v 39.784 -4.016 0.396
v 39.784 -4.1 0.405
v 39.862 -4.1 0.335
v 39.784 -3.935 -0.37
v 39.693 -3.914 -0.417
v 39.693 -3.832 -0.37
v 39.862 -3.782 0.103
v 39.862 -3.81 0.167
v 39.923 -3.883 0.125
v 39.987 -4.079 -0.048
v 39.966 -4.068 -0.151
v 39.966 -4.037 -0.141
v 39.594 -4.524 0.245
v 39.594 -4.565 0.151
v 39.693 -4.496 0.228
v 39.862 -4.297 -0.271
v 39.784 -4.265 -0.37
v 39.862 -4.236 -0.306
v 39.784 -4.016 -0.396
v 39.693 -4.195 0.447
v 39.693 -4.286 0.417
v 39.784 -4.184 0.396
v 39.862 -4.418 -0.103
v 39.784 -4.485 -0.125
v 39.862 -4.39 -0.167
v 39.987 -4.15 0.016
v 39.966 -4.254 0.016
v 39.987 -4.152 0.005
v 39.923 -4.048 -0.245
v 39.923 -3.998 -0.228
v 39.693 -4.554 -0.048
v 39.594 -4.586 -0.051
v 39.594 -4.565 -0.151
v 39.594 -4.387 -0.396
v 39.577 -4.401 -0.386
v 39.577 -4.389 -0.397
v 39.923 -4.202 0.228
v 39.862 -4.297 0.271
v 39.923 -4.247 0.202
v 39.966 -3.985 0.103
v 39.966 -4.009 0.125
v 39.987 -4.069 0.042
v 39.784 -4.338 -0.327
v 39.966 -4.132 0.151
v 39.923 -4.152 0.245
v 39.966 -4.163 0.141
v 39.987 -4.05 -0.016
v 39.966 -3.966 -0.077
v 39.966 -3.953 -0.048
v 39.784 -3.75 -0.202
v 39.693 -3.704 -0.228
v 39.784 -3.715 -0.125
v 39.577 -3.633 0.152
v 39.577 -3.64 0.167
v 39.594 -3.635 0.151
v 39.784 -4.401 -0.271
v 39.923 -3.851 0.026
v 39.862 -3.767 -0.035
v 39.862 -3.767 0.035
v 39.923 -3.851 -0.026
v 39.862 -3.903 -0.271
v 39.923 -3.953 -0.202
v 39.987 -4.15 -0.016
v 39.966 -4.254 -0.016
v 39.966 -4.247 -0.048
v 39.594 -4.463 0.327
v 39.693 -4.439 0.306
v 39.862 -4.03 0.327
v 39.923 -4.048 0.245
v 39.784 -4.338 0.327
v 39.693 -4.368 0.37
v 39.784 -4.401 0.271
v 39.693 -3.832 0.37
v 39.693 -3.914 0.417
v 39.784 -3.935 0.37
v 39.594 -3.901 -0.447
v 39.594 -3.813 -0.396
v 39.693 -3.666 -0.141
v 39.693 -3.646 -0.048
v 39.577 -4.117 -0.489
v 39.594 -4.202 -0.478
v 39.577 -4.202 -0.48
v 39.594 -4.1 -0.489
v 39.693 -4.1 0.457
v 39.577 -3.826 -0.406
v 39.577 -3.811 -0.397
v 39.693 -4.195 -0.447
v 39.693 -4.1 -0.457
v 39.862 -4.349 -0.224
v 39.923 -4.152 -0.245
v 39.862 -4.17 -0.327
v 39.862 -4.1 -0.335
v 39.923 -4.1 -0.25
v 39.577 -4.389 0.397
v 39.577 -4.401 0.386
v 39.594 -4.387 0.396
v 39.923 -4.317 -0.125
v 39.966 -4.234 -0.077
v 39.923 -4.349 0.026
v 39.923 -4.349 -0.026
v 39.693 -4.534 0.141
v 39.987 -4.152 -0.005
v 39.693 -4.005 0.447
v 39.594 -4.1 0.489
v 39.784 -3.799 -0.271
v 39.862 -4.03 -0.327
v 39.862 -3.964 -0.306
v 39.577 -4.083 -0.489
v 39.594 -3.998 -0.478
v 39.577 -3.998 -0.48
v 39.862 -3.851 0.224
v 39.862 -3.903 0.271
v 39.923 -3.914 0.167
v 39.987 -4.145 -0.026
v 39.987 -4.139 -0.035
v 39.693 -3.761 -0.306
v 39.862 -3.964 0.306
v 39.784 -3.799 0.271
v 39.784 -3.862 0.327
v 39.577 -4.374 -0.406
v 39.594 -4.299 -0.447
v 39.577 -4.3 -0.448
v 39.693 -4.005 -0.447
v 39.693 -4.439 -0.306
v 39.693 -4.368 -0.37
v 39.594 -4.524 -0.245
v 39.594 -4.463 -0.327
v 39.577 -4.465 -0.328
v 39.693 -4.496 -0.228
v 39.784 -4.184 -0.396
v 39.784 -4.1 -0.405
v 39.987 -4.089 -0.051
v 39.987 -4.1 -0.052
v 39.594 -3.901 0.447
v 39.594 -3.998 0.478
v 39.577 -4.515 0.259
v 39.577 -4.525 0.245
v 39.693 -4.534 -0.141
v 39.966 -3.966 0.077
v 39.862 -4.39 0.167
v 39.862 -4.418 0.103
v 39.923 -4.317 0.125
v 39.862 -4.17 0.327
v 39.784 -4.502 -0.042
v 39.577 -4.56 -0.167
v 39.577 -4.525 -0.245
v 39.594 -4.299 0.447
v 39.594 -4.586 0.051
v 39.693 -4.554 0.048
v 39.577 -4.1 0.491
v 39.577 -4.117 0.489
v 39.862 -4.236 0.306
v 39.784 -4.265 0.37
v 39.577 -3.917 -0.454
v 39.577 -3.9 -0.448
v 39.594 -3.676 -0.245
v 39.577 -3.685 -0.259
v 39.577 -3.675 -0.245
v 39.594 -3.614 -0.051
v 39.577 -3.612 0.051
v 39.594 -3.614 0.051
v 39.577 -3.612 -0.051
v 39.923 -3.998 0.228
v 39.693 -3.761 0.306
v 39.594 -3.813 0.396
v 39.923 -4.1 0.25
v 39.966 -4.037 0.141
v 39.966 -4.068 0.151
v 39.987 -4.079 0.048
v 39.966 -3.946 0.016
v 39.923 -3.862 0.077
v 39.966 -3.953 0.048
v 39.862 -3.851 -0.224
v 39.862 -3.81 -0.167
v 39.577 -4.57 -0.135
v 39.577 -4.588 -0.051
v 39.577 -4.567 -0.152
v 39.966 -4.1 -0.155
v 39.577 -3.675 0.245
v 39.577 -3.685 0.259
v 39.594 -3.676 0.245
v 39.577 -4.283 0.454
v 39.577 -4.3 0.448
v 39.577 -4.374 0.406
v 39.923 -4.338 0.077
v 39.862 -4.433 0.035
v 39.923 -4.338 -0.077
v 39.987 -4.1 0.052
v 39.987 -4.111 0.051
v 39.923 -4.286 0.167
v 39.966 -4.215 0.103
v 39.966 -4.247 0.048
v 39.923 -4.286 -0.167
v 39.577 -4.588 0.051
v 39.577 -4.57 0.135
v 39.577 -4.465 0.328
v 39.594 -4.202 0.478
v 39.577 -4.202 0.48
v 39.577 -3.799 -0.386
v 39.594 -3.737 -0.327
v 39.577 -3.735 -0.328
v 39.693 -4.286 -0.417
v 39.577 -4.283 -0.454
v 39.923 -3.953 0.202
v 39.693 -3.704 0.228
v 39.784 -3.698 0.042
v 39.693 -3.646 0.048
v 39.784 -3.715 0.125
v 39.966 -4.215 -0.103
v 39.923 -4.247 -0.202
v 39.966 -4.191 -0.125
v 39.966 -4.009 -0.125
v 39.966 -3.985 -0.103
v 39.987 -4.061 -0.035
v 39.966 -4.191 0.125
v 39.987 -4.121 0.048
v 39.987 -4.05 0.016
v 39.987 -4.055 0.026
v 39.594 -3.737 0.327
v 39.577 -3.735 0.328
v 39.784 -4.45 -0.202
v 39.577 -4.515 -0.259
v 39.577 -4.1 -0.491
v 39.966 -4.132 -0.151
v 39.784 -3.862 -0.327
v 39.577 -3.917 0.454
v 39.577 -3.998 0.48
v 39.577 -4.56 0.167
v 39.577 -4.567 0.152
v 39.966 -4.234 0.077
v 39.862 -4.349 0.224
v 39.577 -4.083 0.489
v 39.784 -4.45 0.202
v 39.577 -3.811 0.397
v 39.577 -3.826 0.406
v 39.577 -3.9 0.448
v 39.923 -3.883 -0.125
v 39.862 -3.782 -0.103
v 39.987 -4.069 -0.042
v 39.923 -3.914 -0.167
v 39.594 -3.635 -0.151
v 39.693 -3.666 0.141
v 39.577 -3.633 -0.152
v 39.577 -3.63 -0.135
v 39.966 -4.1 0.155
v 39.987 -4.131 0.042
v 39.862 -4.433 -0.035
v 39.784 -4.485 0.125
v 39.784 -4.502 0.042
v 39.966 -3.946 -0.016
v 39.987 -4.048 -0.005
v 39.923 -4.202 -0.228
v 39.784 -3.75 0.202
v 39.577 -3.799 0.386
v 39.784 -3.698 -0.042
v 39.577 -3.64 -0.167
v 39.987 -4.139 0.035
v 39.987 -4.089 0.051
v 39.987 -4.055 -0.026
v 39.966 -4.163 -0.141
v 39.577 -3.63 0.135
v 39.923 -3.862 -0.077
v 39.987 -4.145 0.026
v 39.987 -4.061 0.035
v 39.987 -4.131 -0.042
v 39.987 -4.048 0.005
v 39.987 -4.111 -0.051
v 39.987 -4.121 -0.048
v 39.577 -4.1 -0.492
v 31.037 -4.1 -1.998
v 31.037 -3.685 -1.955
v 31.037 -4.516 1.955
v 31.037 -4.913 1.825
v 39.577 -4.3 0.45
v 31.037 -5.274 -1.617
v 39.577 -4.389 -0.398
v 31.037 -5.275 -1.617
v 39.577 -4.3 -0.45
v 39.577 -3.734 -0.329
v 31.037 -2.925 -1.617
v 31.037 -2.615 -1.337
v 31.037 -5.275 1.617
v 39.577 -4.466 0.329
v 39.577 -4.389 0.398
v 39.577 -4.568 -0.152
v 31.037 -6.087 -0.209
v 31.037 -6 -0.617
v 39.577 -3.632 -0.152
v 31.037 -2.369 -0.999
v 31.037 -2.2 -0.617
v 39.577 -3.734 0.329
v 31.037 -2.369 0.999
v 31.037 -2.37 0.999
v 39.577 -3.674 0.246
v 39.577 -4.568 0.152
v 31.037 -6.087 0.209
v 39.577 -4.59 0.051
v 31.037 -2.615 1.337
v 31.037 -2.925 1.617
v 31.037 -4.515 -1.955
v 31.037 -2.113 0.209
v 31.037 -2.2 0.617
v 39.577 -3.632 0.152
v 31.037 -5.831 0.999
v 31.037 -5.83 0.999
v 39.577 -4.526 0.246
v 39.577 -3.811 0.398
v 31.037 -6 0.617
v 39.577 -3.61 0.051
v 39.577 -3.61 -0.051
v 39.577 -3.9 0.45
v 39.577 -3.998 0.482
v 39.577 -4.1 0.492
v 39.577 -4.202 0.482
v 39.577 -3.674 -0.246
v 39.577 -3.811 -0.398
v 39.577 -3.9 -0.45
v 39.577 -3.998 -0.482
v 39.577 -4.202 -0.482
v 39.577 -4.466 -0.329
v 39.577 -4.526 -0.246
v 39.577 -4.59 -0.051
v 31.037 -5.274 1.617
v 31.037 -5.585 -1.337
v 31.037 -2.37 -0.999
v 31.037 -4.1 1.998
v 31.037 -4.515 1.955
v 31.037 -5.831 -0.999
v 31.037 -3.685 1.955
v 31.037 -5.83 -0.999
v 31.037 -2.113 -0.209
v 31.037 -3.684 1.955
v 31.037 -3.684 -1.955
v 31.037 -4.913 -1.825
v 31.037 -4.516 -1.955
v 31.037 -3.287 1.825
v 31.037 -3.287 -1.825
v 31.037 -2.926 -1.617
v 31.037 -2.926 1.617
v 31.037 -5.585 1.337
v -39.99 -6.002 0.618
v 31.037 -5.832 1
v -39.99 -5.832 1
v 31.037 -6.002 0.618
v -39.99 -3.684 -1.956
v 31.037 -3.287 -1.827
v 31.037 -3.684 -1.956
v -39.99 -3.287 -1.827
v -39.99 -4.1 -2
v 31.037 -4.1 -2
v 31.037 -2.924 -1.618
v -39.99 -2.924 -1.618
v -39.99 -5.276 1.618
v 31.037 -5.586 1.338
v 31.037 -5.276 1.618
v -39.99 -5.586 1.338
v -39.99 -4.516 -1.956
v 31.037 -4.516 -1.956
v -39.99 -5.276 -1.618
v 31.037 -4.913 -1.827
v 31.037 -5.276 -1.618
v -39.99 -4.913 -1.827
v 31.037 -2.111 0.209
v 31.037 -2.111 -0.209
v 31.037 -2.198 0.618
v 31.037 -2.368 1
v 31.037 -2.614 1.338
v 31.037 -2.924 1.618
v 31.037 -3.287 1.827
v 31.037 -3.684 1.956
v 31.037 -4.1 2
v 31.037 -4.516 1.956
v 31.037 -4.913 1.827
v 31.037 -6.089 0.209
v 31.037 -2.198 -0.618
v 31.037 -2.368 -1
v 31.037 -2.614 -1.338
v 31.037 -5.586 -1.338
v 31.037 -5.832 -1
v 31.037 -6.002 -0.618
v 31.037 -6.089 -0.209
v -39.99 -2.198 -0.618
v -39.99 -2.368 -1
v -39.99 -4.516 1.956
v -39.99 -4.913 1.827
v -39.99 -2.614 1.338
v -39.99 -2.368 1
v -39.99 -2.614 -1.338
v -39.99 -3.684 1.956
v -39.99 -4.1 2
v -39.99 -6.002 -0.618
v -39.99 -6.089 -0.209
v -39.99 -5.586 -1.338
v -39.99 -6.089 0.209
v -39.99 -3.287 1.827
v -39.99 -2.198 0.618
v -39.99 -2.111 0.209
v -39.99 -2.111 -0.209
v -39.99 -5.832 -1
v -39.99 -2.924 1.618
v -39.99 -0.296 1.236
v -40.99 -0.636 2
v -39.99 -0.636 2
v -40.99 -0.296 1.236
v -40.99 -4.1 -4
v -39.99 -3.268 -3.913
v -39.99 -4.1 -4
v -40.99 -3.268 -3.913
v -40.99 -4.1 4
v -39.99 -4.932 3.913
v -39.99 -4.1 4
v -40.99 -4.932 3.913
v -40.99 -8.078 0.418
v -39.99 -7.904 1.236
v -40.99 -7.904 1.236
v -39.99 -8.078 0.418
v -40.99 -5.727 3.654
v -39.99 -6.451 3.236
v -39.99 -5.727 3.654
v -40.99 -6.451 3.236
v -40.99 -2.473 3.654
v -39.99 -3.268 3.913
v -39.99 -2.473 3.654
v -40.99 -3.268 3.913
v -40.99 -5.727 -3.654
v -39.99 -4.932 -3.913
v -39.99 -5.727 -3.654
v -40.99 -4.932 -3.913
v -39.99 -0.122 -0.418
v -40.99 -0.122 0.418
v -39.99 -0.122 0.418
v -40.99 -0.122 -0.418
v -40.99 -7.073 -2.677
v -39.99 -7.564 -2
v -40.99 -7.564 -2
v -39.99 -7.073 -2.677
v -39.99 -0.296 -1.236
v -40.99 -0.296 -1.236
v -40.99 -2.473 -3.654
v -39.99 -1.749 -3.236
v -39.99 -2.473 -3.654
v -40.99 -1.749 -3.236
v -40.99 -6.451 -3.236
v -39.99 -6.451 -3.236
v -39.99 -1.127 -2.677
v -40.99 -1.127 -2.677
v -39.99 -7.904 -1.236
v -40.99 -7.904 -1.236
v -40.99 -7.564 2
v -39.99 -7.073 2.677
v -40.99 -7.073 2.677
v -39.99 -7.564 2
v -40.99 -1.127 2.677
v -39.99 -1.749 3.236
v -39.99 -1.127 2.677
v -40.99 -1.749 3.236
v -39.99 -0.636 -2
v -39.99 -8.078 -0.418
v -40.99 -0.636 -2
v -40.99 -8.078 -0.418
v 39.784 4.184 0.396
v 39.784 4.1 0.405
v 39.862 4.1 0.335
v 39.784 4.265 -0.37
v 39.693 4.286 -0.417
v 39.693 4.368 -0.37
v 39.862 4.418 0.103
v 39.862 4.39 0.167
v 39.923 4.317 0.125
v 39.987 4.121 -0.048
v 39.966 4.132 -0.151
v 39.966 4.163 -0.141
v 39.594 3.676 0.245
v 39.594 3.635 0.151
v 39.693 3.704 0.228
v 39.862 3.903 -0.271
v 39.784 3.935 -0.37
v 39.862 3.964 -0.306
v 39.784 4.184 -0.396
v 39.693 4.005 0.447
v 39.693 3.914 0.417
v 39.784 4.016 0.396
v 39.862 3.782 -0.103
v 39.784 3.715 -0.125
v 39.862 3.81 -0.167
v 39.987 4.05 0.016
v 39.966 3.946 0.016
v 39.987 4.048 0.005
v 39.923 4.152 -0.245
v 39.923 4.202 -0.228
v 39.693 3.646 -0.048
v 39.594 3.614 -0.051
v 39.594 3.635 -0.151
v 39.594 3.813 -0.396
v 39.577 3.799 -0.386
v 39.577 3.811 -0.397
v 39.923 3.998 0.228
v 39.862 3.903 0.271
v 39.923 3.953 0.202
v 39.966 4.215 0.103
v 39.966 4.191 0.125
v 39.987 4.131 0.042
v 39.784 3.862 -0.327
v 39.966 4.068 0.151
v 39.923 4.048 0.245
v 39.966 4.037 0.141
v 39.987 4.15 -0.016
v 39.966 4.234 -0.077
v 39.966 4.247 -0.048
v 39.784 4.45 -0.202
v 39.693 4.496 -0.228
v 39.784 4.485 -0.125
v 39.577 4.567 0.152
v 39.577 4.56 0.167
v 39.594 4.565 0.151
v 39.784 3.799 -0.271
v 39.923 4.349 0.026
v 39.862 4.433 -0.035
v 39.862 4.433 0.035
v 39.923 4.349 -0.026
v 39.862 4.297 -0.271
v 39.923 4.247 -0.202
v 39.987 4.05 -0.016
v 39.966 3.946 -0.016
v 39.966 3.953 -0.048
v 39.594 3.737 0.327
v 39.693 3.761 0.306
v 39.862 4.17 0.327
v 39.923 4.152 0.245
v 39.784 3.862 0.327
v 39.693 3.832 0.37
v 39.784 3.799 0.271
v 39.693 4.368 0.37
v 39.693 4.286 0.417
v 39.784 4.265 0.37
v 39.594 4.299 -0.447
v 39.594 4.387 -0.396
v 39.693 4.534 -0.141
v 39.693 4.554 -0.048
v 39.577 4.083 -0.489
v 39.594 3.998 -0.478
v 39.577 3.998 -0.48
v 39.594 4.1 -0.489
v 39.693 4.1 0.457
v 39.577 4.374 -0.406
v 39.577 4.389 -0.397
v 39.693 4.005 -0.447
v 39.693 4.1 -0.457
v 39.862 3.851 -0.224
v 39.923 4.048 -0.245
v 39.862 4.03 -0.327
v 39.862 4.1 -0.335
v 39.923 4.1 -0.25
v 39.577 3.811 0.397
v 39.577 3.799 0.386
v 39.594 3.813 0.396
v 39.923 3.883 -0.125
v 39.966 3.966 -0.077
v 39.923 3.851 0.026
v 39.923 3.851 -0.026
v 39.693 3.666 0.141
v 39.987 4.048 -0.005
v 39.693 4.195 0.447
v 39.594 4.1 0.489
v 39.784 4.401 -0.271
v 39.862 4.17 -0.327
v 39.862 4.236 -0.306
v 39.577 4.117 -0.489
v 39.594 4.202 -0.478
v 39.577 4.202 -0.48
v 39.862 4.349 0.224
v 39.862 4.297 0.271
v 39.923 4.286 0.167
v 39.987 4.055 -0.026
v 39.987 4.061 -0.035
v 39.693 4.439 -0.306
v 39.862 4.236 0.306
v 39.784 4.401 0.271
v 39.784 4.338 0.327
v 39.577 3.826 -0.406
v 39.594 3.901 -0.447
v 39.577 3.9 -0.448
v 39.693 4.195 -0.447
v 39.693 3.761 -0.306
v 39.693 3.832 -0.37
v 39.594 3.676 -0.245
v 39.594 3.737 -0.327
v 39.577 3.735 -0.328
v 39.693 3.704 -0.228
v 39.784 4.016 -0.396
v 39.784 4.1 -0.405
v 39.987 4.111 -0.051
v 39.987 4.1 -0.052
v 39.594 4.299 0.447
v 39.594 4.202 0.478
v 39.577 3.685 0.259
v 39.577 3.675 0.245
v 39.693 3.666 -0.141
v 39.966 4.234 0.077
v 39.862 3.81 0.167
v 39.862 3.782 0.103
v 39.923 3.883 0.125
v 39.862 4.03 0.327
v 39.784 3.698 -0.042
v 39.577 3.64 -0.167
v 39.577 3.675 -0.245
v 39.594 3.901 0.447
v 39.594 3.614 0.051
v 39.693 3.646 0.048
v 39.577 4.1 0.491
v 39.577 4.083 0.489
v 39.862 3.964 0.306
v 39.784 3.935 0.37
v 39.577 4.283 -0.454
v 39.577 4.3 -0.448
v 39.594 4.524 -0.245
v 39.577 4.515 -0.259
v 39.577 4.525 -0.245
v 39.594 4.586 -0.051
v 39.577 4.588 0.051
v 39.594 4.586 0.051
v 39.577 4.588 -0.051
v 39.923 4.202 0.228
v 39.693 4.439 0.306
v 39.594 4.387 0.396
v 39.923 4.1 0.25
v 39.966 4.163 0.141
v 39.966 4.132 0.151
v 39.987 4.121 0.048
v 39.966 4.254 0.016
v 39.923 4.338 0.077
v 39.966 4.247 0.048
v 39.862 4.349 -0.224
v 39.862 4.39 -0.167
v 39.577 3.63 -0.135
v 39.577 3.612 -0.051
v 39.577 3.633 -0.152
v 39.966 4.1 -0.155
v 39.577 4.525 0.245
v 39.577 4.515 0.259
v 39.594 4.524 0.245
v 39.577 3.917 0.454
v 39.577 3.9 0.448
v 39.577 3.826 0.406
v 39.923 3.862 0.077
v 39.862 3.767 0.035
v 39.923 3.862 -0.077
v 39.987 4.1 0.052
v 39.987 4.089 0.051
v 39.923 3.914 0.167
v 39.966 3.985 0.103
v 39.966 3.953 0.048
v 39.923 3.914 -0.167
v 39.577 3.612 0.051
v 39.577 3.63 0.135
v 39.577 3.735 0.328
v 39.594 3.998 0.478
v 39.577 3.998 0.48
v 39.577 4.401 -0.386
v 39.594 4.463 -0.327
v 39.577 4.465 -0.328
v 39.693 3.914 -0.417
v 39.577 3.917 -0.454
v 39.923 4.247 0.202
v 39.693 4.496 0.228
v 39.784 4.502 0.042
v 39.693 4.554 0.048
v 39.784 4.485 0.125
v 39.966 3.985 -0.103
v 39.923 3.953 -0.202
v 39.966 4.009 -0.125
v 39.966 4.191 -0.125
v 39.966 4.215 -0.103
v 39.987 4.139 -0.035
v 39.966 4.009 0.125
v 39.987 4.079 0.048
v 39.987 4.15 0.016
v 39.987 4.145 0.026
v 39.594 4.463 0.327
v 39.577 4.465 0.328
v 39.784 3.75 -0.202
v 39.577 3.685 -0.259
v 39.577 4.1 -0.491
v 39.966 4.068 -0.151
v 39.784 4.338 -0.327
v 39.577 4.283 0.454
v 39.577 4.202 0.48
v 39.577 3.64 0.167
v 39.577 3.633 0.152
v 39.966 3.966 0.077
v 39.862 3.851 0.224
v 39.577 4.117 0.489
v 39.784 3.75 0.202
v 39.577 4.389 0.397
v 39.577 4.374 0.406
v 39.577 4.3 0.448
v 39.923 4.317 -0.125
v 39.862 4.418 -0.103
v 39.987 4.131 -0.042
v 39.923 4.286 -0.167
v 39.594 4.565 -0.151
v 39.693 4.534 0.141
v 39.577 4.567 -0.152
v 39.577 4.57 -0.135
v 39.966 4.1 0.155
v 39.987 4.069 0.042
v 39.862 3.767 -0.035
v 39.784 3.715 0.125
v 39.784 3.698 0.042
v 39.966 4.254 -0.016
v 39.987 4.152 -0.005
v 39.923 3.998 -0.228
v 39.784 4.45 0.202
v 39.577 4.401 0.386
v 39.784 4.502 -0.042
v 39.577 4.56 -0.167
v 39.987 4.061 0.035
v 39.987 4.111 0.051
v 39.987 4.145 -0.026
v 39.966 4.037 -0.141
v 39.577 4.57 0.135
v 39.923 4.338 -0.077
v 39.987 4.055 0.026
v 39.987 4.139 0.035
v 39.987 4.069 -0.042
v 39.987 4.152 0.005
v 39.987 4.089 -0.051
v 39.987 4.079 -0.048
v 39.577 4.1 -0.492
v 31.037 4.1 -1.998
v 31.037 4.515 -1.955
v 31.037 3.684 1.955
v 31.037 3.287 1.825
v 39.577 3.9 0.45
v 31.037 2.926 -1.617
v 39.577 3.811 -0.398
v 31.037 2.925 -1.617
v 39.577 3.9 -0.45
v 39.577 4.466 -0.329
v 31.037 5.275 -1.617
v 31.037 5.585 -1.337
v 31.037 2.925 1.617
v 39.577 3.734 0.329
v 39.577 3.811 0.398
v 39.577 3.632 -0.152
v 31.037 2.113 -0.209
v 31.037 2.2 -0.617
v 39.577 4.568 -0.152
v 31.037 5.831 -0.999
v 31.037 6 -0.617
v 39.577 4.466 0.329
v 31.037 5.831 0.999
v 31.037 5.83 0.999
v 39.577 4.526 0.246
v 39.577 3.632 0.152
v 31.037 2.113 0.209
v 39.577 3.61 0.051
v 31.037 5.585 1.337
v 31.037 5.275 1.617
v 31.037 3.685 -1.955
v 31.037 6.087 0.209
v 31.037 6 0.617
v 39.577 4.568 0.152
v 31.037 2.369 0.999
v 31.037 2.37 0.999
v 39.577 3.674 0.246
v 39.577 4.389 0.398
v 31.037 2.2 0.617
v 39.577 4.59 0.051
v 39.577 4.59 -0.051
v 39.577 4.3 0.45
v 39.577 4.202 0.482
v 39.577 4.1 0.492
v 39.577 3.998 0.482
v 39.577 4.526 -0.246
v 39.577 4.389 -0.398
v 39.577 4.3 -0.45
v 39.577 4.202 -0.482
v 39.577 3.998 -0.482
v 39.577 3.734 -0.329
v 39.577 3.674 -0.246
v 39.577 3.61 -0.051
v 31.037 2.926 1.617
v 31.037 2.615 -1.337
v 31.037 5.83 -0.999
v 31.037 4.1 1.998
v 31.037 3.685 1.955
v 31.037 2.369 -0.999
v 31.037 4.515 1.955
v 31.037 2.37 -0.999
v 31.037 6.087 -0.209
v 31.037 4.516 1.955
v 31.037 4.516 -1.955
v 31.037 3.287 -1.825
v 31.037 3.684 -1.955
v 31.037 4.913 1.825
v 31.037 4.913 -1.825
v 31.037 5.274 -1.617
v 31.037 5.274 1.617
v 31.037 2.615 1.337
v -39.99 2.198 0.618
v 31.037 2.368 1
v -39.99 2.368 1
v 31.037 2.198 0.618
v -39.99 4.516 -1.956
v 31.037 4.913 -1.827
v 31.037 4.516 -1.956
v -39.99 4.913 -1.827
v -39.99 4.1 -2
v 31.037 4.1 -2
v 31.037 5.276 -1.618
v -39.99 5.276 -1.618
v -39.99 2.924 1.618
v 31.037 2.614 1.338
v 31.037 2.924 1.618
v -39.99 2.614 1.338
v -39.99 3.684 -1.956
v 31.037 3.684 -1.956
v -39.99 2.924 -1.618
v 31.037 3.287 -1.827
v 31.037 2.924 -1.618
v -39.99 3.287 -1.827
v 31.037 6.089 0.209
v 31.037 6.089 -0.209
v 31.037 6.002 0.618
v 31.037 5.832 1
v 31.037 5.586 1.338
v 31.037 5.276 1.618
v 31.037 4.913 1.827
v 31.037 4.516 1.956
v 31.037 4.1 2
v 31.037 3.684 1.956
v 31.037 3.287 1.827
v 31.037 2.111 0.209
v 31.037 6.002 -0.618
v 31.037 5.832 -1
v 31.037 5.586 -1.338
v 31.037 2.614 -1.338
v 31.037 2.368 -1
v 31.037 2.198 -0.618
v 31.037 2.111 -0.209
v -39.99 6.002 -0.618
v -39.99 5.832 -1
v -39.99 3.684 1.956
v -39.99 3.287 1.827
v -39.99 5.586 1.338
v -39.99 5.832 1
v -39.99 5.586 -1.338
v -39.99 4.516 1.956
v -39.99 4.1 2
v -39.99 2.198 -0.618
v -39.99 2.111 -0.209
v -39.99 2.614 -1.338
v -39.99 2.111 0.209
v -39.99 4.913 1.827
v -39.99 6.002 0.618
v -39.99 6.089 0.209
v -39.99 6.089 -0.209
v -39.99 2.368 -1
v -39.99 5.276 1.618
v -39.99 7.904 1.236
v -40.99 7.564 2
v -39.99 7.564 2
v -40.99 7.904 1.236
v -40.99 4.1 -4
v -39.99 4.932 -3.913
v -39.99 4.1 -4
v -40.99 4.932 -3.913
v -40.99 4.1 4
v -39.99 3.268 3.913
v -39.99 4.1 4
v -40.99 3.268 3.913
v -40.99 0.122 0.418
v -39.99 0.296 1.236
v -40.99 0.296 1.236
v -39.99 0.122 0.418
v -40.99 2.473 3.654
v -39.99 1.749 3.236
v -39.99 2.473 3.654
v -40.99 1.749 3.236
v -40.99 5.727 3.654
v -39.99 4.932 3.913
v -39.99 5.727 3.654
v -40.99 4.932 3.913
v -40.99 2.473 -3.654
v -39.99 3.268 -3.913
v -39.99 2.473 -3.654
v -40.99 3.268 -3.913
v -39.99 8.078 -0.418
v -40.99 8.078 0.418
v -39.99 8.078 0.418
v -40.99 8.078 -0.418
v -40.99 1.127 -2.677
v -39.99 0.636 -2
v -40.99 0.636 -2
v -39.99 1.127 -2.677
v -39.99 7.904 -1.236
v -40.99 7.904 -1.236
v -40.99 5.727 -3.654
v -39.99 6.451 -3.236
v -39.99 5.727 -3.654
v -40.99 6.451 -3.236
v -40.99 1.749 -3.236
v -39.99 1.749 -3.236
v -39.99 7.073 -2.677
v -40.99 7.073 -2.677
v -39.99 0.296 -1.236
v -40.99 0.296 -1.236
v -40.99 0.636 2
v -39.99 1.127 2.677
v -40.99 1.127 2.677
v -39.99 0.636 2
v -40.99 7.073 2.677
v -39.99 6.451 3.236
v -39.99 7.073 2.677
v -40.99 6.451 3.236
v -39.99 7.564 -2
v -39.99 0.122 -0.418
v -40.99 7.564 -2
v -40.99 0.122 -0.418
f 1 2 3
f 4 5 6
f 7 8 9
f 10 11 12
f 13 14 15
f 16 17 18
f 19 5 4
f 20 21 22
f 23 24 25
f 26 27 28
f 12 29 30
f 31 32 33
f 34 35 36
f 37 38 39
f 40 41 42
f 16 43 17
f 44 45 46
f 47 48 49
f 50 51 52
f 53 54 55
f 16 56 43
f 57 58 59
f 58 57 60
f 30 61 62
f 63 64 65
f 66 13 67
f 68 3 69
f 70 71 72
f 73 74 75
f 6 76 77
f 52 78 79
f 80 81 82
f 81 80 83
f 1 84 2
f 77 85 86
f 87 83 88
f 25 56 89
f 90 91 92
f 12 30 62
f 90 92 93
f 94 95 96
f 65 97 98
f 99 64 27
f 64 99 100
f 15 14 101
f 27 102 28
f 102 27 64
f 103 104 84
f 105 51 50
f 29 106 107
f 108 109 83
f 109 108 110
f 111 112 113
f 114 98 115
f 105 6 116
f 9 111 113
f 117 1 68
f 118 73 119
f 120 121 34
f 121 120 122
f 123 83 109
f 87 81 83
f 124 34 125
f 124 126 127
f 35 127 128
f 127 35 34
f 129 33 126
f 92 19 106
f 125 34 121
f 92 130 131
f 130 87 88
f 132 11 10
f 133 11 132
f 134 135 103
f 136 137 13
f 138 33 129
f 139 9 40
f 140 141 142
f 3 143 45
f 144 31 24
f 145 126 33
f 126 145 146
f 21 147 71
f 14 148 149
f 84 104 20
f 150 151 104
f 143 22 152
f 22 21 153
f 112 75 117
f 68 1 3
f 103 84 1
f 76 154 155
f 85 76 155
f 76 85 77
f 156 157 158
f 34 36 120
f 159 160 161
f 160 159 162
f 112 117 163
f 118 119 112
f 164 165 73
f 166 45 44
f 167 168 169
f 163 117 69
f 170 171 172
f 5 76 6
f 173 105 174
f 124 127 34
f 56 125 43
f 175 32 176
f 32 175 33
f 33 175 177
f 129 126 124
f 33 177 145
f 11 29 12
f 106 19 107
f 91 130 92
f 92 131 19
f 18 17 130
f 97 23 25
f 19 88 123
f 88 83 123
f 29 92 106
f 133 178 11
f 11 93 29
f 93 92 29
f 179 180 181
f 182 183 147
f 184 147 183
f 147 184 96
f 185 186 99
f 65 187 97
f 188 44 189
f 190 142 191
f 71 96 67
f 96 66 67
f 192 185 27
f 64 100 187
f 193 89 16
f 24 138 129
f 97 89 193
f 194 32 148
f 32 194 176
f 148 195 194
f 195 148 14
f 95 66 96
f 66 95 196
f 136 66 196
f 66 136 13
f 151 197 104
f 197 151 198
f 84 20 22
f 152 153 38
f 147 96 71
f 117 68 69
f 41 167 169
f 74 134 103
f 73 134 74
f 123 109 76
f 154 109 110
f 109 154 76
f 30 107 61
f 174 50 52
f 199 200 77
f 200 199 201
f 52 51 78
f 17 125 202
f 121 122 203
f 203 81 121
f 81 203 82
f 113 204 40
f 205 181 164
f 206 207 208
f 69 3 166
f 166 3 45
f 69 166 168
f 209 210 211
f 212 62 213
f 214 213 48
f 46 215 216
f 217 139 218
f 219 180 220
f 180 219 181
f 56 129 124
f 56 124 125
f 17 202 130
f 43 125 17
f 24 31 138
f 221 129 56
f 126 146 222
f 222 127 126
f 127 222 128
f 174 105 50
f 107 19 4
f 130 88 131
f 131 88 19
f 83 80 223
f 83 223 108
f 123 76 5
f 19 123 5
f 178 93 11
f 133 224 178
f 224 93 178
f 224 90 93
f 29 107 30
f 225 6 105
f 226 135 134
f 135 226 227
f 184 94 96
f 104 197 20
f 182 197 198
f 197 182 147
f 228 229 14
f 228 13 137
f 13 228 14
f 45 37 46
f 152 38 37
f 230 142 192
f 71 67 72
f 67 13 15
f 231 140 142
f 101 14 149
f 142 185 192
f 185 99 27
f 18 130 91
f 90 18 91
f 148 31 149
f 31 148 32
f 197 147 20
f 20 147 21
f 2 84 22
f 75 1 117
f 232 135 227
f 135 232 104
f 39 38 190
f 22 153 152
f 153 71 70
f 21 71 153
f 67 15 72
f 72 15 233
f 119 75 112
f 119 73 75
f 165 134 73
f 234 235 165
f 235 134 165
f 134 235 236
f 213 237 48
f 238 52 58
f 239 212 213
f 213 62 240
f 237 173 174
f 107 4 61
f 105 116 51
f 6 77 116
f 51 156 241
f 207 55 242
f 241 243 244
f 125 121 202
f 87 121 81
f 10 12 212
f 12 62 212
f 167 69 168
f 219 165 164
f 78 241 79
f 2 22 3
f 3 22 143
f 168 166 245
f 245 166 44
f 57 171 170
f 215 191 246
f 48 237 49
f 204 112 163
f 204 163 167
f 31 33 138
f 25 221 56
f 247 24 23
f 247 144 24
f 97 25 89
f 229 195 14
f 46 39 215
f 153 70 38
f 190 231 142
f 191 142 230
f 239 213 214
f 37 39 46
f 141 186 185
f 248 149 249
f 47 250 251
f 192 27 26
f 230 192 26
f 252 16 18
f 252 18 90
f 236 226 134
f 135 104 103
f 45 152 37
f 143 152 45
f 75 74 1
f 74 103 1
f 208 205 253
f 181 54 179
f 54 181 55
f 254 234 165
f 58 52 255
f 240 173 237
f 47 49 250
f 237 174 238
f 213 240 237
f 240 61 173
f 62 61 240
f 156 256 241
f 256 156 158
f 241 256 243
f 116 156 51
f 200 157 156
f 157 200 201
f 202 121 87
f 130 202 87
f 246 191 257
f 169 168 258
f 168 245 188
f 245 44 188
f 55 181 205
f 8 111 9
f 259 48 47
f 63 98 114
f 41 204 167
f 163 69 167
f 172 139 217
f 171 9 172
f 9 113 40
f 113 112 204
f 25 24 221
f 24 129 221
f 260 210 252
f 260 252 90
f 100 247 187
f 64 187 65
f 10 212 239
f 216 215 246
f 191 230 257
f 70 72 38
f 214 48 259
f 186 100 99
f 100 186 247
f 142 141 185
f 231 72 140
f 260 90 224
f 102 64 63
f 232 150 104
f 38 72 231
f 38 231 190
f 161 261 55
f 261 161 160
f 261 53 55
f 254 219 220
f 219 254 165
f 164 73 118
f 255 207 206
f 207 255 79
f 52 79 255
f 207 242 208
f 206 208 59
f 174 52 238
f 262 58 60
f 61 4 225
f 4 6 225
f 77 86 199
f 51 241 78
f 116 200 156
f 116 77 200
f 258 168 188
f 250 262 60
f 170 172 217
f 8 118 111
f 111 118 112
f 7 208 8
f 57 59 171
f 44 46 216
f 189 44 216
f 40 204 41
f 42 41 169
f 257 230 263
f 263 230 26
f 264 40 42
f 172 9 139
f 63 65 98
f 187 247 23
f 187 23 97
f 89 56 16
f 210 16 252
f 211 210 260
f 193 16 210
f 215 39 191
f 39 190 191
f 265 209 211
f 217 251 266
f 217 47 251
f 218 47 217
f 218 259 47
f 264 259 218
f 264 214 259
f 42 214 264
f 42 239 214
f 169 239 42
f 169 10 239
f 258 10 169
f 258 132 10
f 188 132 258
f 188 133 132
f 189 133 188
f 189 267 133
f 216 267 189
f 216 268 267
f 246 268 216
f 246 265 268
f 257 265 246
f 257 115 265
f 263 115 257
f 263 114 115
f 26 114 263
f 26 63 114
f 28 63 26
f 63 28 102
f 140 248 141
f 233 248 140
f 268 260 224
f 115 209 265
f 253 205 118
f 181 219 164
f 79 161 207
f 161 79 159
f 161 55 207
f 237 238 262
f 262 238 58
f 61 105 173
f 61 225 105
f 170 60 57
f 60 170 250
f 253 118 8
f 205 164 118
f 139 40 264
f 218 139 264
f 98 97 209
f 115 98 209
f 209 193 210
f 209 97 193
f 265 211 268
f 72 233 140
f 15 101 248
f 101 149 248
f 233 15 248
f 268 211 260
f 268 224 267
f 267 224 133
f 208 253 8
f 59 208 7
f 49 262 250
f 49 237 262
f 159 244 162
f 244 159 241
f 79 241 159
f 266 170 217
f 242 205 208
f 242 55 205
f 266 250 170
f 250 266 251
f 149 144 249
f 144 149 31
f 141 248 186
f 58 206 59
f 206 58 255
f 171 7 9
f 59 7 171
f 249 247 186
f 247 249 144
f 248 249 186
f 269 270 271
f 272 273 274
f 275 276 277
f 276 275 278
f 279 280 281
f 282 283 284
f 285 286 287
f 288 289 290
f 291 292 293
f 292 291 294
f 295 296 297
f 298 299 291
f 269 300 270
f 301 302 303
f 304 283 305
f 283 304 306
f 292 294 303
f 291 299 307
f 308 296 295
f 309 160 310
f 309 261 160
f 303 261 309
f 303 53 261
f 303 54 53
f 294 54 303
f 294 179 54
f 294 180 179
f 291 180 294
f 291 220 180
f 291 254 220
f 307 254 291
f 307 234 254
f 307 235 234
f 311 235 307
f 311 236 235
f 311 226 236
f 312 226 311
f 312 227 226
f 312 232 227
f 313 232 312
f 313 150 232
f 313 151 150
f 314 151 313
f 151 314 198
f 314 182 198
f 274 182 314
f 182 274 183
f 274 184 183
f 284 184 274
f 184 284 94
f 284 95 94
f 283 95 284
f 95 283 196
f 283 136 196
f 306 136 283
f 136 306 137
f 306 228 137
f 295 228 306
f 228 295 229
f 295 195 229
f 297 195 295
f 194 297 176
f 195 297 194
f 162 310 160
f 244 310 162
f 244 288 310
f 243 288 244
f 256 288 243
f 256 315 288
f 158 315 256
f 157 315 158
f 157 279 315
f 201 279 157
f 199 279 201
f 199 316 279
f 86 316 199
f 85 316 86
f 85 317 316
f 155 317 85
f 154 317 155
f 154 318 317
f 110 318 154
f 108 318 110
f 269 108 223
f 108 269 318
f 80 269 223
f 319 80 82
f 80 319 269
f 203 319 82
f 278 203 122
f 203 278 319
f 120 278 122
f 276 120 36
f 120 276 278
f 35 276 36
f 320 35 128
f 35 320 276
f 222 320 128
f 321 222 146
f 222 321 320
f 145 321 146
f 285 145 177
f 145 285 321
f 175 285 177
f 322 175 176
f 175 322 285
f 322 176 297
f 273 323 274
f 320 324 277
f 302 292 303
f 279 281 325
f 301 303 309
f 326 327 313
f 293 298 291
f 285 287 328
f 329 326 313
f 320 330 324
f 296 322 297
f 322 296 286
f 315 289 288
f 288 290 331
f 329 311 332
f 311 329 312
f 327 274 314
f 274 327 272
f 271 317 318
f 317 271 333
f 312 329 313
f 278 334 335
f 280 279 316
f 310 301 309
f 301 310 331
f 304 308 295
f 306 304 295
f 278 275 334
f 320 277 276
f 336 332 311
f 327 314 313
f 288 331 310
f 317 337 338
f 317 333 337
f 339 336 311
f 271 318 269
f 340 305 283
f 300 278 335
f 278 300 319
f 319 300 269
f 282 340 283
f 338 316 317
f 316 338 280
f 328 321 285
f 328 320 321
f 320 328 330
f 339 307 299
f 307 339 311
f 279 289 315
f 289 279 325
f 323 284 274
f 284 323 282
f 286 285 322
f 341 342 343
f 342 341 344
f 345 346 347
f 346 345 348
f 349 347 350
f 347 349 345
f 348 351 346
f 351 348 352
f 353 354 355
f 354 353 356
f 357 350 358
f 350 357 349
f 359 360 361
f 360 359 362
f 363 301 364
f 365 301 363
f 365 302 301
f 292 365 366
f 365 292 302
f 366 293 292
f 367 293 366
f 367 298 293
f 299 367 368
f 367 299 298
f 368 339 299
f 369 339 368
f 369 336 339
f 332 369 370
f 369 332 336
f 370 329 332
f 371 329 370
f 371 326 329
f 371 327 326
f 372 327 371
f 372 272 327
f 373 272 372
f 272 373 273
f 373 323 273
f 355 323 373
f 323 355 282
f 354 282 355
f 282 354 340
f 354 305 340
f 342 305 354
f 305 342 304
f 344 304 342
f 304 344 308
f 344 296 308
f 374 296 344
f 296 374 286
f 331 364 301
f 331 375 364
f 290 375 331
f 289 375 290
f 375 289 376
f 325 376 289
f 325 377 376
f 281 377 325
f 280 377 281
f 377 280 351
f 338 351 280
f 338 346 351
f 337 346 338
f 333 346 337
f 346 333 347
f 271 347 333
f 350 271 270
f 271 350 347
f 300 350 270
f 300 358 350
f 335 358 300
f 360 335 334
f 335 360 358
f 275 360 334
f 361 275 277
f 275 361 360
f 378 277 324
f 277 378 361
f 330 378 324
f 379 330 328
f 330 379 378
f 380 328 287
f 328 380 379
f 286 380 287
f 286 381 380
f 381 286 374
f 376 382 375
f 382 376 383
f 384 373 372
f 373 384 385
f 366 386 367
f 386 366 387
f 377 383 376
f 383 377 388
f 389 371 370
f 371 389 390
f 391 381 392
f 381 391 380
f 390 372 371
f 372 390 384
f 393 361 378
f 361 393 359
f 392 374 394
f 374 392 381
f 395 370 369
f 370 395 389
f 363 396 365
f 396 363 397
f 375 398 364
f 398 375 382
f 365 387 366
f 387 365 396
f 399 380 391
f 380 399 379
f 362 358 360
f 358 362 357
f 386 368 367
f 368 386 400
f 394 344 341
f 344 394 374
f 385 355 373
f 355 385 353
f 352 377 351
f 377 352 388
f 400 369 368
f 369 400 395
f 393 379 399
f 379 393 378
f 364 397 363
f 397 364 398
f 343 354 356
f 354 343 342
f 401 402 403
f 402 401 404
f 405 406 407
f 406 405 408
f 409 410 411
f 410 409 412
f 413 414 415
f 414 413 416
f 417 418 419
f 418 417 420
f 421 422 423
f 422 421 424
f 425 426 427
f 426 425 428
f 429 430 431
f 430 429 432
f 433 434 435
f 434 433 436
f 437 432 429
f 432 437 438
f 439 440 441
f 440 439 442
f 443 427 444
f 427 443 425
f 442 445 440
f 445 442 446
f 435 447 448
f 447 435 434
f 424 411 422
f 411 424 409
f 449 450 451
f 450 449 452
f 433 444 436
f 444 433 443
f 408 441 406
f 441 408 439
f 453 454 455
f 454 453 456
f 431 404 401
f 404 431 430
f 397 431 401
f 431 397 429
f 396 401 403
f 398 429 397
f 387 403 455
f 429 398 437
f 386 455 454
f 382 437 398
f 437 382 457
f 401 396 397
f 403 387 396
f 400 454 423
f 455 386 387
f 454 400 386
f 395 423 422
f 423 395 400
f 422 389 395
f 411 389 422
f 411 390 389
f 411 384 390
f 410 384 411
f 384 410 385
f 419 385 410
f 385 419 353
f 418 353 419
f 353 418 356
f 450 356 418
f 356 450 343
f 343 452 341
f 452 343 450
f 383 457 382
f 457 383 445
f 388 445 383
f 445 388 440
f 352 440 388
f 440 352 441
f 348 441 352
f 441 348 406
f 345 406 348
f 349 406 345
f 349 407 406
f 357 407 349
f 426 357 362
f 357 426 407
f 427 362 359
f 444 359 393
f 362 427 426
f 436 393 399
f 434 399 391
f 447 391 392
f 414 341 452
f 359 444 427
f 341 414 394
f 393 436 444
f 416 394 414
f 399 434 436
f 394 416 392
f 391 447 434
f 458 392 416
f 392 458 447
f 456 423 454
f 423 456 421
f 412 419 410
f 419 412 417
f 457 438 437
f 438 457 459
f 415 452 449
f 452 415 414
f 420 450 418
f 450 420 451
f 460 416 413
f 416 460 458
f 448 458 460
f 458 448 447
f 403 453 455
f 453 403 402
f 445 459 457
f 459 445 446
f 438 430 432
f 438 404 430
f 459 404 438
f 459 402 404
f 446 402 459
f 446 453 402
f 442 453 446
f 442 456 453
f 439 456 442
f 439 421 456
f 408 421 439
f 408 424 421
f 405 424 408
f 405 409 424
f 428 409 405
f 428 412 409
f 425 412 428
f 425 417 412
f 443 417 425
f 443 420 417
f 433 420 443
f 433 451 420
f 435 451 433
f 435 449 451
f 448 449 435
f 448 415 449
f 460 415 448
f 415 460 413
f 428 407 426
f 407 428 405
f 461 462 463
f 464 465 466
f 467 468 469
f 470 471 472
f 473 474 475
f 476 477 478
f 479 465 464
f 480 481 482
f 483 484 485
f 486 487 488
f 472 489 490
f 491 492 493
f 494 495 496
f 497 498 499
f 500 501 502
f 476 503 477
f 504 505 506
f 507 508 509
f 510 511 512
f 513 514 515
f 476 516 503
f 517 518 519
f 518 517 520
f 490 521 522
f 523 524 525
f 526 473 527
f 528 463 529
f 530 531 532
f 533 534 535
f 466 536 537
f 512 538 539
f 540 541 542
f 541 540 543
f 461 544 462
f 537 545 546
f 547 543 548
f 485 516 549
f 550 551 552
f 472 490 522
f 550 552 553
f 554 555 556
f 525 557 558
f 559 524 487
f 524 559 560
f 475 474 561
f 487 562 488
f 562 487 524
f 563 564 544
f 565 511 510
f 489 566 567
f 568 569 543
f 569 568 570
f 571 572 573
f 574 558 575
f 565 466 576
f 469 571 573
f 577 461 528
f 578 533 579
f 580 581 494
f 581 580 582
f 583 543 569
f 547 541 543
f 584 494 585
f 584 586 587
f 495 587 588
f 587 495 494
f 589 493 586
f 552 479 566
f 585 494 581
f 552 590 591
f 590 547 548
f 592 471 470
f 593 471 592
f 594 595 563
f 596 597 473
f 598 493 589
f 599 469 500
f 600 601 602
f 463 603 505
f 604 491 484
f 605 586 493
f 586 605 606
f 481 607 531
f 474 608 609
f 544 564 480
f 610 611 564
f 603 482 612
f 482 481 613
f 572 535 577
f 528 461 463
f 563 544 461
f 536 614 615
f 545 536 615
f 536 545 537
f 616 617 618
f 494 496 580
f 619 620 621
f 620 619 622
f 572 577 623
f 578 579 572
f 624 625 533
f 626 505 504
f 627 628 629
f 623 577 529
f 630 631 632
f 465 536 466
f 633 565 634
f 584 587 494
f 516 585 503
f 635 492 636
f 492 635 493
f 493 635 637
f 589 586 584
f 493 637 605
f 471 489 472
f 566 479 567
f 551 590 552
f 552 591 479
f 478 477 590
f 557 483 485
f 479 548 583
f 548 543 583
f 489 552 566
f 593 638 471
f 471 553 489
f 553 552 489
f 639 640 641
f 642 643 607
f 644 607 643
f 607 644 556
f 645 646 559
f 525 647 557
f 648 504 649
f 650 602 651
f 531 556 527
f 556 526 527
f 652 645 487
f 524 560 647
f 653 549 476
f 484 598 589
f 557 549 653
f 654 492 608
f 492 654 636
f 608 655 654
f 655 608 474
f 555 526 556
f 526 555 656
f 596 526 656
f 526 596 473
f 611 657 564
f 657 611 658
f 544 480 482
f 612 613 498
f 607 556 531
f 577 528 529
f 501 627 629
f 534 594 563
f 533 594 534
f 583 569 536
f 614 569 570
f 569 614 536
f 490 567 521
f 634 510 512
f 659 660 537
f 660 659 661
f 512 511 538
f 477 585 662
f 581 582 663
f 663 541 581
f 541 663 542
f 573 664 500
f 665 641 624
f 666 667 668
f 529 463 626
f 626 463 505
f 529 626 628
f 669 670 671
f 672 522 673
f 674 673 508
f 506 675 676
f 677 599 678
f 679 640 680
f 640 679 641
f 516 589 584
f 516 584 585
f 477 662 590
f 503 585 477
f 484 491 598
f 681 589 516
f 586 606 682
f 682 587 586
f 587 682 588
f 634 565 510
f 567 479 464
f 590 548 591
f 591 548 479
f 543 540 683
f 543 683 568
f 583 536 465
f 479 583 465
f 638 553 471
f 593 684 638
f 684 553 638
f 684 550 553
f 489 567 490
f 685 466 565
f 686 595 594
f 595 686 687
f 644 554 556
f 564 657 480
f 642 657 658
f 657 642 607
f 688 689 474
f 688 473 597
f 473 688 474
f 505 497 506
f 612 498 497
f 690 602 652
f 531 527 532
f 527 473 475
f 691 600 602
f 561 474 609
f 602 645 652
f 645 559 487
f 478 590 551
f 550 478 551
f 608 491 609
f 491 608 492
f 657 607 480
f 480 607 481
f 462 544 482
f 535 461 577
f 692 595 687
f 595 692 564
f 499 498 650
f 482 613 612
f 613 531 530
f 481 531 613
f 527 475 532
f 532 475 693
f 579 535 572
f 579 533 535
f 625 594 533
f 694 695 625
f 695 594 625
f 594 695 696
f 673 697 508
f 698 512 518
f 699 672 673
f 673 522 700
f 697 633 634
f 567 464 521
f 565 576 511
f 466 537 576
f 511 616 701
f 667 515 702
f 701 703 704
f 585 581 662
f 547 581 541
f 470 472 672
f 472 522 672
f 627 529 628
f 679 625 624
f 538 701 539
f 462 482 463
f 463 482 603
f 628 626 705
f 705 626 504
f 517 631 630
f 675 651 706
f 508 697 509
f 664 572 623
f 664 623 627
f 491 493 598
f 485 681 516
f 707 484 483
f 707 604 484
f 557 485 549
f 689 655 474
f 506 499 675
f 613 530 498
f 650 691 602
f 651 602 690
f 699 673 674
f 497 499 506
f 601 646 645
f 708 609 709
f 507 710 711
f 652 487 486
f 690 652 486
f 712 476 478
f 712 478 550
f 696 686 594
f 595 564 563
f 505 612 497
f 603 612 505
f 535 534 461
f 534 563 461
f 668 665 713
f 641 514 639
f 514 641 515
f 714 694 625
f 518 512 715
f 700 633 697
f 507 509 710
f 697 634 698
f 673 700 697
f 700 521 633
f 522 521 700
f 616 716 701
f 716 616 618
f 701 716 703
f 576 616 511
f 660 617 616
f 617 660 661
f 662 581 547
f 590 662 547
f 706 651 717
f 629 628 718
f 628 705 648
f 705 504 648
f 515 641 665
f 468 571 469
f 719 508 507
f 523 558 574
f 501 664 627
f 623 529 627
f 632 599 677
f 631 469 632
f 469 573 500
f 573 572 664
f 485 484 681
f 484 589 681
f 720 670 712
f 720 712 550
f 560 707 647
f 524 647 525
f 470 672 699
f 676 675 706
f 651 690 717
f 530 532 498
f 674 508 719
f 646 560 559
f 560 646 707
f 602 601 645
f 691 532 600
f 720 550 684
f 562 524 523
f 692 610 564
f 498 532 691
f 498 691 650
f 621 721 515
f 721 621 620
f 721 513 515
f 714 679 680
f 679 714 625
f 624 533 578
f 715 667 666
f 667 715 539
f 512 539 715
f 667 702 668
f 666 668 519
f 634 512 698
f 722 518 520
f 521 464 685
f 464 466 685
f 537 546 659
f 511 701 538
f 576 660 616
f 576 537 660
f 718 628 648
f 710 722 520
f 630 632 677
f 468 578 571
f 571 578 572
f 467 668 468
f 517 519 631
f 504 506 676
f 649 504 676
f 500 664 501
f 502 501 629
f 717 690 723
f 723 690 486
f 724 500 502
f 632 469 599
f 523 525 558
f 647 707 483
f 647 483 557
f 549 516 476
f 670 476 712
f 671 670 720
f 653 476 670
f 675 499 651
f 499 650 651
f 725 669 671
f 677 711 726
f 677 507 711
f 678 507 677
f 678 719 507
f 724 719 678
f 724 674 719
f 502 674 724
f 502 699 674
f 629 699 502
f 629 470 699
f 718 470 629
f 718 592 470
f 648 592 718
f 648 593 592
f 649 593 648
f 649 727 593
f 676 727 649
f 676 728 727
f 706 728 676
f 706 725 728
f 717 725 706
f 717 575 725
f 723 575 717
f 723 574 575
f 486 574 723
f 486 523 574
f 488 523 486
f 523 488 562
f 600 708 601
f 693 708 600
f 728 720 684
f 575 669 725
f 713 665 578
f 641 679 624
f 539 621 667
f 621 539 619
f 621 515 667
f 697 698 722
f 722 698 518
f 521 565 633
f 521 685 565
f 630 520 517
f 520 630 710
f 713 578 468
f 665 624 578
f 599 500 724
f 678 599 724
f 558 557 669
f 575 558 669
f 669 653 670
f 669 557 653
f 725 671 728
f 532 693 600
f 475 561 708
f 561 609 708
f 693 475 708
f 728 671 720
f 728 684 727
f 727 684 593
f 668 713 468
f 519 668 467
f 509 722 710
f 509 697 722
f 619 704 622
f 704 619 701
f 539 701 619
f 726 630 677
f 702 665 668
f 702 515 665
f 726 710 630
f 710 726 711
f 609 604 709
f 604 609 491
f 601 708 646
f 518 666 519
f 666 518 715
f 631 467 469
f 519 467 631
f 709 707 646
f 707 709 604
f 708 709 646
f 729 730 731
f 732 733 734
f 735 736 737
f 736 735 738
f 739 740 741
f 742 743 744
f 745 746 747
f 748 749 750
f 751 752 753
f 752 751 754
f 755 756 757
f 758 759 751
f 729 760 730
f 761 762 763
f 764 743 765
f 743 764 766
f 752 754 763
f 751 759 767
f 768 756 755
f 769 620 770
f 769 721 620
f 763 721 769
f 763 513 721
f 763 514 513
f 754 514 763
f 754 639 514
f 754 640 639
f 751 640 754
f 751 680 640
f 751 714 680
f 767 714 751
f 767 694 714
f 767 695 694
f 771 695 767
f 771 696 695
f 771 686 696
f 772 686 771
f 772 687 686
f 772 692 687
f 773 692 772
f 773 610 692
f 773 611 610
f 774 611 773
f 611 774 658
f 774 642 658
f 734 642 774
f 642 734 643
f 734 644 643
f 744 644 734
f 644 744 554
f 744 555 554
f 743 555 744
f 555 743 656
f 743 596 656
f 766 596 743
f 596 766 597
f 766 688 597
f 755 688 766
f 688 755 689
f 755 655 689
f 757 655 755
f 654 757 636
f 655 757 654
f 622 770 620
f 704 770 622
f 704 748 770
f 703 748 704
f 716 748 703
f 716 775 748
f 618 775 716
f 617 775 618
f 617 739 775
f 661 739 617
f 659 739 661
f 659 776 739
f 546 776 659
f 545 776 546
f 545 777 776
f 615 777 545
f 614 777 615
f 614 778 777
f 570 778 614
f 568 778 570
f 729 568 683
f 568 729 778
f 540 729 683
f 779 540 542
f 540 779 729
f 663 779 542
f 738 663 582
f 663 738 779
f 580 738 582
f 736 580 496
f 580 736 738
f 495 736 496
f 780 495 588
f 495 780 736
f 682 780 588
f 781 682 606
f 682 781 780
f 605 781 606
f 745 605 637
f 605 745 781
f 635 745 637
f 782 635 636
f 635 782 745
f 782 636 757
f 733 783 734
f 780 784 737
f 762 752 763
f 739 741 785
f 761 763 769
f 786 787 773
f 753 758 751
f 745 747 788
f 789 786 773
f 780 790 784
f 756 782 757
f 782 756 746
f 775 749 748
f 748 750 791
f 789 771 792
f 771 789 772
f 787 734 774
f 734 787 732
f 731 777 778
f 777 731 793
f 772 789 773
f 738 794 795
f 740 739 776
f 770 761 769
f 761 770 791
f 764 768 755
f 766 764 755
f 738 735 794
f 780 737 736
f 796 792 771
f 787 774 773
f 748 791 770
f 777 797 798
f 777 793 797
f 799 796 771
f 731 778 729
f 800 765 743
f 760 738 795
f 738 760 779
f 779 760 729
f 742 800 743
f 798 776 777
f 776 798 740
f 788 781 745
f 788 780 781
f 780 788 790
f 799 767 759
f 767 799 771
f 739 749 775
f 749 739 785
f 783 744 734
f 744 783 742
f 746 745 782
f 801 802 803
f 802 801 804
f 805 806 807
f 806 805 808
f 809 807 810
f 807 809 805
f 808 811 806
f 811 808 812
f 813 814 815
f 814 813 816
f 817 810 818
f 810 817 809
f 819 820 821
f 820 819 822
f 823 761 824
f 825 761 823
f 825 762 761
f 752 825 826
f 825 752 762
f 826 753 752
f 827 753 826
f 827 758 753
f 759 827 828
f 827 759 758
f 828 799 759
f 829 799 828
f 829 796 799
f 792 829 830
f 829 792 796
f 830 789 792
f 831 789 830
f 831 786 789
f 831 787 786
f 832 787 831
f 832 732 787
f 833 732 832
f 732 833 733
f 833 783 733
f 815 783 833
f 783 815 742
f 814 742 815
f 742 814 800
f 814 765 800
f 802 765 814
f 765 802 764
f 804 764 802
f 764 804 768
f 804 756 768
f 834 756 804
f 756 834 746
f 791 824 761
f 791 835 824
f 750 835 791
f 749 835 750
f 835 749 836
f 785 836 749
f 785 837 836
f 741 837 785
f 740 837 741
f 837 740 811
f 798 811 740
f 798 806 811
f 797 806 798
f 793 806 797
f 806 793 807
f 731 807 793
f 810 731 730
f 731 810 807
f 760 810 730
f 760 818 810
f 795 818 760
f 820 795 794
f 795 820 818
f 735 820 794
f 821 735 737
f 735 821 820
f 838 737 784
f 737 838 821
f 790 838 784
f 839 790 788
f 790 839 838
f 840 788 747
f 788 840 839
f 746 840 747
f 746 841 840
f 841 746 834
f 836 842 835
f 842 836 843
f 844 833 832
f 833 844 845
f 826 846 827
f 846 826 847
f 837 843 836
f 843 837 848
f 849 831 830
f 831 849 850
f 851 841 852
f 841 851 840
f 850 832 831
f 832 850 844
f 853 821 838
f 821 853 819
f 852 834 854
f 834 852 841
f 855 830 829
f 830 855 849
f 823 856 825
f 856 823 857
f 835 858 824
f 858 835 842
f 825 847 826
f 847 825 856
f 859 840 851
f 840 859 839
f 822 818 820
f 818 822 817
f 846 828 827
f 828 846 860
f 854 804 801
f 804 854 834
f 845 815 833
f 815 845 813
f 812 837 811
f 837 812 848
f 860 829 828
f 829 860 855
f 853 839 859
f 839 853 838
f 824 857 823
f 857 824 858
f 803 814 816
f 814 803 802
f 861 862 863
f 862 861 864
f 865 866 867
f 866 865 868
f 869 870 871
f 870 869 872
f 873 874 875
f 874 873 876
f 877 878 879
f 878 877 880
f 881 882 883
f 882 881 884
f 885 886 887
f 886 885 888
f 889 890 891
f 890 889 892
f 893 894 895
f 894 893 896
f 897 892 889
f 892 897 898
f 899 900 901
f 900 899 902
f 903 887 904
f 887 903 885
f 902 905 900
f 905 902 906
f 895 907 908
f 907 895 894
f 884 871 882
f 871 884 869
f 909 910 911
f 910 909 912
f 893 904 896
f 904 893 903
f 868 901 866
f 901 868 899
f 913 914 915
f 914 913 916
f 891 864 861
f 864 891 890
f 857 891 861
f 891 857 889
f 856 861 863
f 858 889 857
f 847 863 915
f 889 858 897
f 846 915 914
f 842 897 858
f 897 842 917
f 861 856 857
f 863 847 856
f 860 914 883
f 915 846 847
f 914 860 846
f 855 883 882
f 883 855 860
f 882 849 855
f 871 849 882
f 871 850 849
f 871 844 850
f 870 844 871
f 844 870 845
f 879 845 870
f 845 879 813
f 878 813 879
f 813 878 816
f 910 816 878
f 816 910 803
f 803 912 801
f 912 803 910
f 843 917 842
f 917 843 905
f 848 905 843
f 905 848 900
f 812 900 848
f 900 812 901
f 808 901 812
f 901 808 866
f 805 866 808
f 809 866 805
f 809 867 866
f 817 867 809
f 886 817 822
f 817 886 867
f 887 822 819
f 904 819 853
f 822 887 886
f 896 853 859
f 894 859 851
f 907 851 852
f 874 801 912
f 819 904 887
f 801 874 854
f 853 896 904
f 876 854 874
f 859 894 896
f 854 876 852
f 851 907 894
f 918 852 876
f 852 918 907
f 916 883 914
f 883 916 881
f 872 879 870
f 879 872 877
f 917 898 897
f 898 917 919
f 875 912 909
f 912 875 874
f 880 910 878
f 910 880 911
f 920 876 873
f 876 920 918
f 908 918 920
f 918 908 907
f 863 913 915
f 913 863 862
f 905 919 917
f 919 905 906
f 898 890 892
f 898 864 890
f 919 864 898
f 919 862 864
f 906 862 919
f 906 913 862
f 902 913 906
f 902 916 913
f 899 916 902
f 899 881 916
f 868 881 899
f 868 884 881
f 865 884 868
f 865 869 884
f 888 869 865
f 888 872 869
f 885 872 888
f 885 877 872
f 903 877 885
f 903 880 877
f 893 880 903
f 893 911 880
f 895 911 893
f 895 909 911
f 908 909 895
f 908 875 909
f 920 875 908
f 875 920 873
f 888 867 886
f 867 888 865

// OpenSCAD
//Created by Ari M. Diacou, February 2014
//Shared under Creative Commons License: Attribution-ShareAlike 3.0 Unported (CC BY-SA 3.0) 
//see http://creativecommons.org/licenses/by-sa/3.0/

//Resolution, higher is smoother.
$fn=30; 
//Length of the needle in mm, tip+shaft.
Length=80; 
//Diameter of the needle in mm.
Diameter=4; 
//Angle that the tip makes.
Angle=20; 
//Of the tip - higher is sharper.
sharpness=4; 
//1=circular, 2=double pointed, 3=straight with butt.
needle_type=3; 
//Each needle produces 2 halves.
number_of_needles=2;
//The bore width that you will insert the filiment to make circular needles.
Wire_Width=2.7; 
//Do you want to slice the needles in half (to make it easier to print on a fused filiment fabricator)?
slice="false";//[true,false] 

/* HIDDEN */
e=0+.01; //Epsilon, a very small number used for ensuring water-tightness.
h=Angle/2;//Half angle. The equations required extensive use of the half angle.
D=Diameter;
R=D/(2*sharpness);//Radius of the sphere that dulls the tip
a=(D/2)*(cos(h)/sin(h))-R/sin(h); //The distance from the shaft/tip interface to the center of the rounding sphere placed on the tip.
L=Length-a-R; //Length of the shaft

if(slice=="true"){
	if(needle_type==1)	lineup(number_of_needles, D*1.2) prepare() circular_needle();
	if(needle_type==2)	lineup(number_of_needles, D*1.2) prepare() dp_needle();
	if(needle_type==3)	lineup(number_of_needles, D*2) prepare() straight_needle();
	}
if(slice=="false"){
	if(needle_type==1)	lineup(number_of_needles/2, D*1.2) prepare2() circular_needle();
	if(needle_type==2)	lineup(number_of_needles/2, D*1.2) prepare2() dp_needle();
	if(needle_type==3)	lineup(number_of_needles/2, D*2.05) prepare2() straight_needle();
	}

module shaft(){
	cylinder(h=L, r=D/2);
	}

module tip(){
	union(){
		translate([0,0,a])
			sphere(R);
		cylinder(h=a+R*sin(h),r1=D/2,r2=R*cos(h));
		}
	}

module back_tip(){ //a tip with a borehole in it to make a circular needle
	difference(){
		tip();
		translate([0,0,e]) cylinder(a+R/sin(h), r=Wire_Width/2);
		}
	}

module circular_needle(){ //a circular needle meant for inserting filiment into the back.
	union(){
		shaft();
		translate([0,0,L-e]) tip();
		translate([0,0,e]) mirror([0,0,1]) back_tip();
		}
	}

module straight_needle(){ //a straight needle with a bump at the end
	union(){
		shaft();
		translate([0,0,L-e]) tip();
		translate([0,0,e]) mirror([0,0,1]) cylinder(h=D/4,r=D);
		}
	}

module dp_needle(){ //a double pointed needle
	union(){
		shaft();
		translate([0,0,L-e]) tip();
		translate([0,0,e]) mirror([0,0,1]) tip();
		}
	}

module lineup(num, space) { //lines up 'num' things with 'space' between the centers of object child(0). Lined up on the y axis on either side of the xz plane.
   for (i = [-num : num-1])
     translate([ 0, space*(i+.5), 0 ]) child(0);
 }

module prepare(){ //Rotates from z-hat direction to x-hat direction, and deletes half
	difference(){
		rotate([0,90,0])	
			translate([0,0,-L/2]) 
				child(0);
		translate([0,0,-D/2-e])
			cube([L+2*(a+R+e),2*(D+e),D+e],center=true);
		}
	}	

module prepare2(){ //just rotation
		rotate([0,90,0])	
			translate([0,0,-Length/2]) 
				child(0);
	}
